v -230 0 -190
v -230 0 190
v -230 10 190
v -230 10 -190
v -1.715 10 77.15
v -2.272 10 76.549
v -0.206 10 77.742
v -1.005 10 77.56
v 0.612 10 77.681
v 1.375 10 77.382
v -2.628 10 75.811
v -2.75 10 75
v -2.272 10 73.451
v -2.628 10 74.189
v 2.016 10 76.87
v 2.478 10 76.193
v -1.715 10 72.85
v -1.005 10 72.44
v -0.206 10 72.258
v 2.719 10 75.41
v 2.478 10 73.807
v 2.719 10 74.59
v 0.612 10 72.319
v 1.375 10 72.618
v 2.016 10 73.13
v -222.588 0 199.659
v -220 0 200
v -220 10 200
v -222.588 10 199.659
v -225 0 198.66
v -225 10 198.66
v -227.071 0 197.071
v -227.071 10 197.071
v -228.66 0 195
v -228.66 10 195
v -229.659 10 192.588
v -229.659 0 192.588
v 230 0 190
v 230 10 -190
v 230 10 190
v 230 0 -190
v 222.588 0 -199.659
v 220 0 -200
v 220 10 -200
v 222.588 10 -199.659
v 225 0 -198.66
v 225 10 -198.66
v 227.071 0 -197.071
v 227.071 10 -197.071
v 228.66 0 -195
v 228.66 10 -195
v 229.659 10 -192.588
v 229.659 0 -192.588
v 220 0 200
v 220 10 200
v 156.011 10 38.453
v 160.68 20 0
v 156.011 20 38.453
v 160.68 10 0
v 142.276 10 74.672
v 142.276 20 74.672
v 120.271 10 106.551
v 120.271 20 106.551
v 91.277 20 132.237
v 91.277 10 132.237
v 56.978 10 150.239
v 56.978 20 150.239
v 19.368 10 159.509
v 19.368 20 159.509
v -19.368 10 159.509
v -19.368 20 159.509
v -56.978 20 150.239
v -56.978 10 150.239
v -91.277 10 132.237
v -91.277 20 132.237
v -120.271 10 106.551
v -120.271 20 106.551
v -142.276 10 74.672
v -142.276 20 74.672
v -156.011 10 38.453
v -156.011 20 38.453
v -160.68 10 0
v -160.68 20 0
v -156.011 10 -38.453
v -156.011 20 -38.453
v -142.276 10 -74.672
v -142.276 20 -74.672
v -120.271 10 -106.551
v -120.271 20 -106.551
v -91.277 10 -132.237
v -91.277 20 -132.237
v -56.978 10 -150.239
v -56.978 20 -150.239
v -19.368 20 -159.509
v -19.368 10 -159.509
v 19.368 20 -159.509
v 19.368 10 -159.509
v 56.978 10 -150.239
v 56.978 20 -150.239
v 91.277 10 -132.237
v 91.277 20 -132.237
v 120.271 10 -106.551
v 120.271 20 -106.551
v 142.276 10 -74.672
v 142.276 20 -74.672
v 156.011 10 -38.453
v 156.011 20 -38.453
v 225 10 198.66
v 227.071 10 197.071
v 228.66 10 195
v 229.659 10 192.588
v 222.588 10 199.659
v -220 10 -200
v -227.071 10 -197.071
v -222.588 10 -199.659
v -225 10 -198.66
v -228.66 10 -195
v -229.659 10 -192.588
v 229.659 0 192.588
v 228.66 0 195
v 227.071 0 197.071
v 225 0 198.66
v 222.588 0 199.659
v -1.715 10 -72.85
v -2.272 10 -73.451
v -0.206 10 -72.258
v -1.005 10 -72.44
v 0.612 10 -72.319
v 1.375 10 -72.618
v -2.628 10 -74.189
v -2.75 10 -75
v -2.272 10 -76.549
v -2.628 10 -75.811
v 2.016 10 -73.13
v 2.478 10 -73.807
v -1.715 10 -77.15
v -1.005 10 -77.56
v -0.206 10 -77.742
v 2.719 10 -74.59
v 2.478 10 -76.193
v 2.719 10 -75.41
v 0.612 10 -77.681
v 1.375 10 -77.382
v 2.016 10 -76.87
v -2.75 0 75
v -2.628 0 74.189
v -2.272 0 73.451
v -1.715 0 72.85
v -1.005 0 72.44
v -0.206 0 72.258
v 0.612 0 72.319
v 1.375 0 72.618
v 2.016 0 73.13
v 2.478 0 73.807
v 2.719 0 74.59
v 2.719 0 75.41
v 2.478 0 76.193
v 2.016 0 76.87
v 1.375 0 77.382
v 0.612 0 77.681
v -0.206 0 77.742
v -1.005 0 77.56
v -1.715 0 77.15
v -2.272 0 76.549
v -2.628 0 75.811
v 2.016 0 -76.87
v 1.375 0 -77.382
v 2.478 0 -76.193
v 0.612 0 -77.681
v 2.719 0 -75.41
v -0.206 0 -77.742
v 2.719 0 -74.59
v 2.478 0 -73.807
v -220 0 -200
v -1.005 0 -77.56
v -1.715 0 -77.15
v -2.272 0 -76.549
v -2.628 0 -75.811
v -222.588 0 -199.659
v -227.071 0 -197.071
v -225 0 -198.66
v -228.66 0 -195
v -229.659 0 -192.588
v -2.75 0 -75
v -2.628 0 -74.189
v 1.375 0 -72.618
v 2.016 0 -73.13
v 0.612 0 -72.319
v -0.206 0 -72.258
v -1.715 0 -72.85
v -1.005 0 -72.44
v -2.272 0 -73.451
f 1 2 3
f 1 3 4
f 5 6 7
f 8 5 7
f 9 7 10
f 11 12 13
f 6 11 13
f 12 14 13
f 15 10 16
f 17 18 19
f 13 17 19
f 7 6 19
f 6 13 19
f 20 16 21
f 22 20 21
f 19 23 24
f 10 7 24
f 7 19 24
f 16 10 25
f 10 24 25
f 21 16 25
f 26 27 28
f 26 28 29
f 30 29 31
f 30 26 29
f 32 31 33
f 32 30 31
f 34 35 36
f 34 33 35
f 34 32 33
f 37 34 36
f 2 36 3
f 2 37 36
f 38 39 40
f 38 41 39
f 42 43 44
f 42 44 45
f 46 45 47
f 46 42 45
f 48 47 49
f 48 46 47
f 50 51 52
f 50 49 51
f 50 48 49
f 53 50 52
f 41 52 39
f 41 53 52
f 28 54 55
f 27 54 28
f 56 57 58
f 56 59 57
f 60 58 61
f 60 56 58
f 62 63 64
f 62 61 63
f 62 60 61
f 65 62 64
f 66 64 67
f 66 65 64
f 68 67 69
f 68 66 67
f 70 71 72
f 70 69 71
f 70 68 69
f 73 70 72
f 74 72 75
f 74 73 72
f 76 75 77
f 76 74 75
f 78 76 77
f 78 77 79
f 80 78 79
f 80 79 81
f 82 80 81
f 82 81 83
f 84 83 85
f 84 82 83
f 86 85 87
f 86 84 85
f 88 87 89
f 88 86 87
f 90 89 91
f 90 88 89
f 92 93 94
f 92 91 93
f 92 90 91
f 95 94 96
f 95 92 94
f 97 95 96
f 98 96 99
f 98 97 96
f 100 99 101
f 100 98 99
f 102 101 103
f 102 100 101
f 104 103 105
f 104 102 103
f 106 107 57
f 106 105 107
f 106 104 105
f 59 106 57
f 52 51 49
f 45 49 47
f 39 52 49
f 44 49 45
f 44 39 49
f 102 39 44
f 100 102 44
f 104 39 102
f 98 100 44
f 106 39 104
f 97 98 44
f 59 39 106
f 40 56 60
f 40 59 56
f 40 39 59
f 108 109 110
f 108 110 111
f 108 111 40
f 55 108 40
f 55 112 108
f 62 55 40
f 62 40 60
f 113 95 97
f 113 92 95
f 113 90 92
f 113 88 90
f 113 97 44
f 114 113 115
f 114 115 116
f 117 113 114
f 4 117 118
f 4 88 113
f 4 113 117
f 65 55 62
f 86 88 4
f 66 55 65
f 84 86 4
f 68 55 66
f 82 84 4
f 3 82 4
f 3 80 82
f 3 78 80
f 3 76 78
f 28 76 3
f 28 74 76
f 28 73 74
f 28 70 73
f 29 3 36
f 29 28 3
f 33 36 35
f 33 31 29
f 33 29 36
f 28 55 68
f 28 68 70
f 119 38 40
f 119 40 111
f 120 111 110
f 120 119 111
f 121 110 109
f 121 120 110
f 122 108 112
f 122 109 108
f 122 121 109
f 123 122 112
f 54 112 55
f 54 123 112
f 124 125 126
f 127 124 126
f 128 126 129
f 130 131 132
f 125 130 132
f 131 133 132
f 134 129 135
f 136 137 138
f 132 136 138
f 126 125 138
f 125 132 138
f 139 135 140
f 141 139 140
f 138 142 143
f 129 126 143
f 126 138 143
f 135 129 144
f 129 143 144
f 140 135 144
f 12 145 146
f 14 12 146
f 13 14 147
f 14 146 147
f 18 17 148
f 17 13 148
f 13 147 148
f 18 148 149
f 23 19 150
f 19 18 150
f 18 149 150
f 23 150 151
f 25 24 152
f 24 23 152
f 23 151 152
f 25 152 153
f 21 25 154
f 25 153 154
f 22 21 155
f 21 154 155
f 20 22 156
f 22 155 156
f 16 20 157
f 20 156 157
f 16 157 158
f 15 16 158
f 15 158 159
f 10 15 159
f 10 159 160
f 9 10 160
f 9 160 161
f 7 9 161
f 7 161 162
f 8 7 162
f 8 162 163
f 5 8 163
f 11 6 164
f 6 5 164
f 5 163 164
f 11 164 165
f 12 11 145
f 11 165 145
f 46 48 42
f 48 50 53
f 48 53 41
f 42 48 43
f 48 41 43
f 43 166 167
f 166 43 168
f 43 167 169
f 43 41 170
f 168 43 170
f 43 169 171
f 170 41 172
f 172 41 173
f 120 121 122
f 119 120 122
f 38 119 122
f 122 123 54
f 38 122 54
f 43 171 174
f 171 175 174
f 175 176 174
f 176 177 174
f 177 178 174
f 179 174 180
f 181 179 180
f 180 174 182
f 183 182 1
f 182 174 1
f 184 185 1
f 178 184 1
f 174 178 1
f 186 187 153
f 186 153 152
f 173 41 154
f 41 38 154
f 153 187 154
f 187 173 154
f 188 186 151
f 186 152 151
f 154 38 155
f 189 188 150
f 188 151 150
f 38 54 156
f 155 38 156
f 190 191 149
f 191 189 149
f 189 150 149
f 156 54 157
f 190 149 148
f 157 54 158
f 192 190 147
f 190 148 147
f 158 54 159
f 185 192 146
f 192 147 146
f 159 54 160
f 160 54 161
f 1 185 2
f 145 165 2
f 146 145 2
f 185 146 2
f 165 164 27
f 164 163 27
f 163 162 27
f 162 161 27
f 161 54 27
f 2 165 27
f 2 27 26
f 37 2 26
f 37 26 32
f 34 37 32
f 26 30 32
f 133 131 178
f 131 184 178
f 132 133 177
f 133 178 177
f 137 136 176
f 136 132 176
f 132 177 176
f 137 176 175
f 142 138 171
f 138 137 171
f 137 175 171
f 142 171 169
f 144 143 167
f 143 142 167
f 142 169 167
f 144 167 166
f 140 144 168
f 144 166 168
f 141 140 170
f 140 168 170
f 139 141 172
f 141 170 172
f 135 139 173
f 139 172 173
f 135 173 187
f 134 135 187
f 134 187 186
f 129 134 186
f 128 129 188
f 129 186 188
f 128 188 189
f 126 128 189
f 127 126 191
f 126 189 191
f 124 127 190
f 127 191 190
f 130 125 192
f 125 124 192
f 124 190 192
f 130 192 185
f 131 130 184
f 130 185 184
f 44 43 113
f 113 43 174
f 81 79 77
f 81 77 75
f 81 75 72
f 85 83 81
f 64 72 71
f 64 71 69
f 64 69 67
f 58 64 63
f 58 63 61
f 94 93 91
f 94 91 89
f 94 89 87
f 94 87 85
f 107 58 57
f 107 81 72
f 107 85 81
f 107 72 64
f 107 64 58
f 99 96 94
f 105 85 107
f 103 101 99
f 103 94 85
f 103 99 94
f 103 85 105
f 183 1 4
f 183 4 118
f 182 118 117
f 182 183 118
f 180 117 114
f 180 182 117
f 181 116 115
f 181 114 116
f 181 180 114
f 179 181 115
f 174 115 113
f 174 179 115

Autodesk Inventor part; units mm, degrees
ref_plane "YZ Plane" through (0, 0, 0) normal (1, 0, 0) x (0, 1, 0)
ref_plane "XZ Plane" through (0, 0, 0) normal (0, 1, 0) x (-1, 0, 0)
ref_plane "XY Plane" through (0, 0, 0) normal (0, 0, 1) x (1, 0, 0)
sketch "Schizzo3" plane through (0, 0, 0) normal (0, 1, 0) x (-1, 0, 0)
  circle A0 centre (0, 75) radius 2.75
  circle A1 centre (0, -75) radius 2.75
  line L0 (-230, 0) -> (-230, 100)
  line L1 (230, 100) -> (230, 0)
  line L2 (-230, 0) -> (-230, -100)
  line L3 (230, -100) -> (230, 0)
  line L4 (-230, 0) -> (-230, 190)
  line L5 (-220, 200) -> (220, 200)
  line L6 (230, 190) -> (230, 2)
  line L7 (-230, 0) -> (-230, -190)
  line L8 (-220, -200) -> (220, -200)
  line L9 (230, -190) -> (230, 0)
  arc A2 (228, 0) -> (230, 2) centre (228, 2) ccw
  arc A3 (230, 190) -> (220, 200) centre (220, 190) ccw
  arc A4 (220, -200) -> (230, -190) centre (220, -190) ccw
  arc A5 (-230, -190) -> (-220, -200) centre (-220, -190) ccw
  arc A6 (-220, 200) -> (-230, 190) centre (-220, 190) ccw
  point P0 (0, 0)
  point P1 (-230, 200)
  point P2 (-230, -200)
  dimension "d18" = 5.5
  dimension "d21" = 5.5
  dimension "d24" = 460
  dimension "d25" = 460
  dimension "d26" = 100
  dimension "d27" = 200
  dimension "d28" = 200
  dimension "d29" = 2
  dimension "d30" = 10
extrude "Estrusione3" add sketch "Schizzo3" along normal blind 10
sketch "Schizzo4" plane through (0, 10, 0) normal (0, 1, 0) x (1, 0, 0)
  circle A0 centre (0, 0) radius 160.6805
extrude "Estrusione4" add sketch "Schizzo4" along normal blind 10
properties part number "Pedana_Stampa 3D"
